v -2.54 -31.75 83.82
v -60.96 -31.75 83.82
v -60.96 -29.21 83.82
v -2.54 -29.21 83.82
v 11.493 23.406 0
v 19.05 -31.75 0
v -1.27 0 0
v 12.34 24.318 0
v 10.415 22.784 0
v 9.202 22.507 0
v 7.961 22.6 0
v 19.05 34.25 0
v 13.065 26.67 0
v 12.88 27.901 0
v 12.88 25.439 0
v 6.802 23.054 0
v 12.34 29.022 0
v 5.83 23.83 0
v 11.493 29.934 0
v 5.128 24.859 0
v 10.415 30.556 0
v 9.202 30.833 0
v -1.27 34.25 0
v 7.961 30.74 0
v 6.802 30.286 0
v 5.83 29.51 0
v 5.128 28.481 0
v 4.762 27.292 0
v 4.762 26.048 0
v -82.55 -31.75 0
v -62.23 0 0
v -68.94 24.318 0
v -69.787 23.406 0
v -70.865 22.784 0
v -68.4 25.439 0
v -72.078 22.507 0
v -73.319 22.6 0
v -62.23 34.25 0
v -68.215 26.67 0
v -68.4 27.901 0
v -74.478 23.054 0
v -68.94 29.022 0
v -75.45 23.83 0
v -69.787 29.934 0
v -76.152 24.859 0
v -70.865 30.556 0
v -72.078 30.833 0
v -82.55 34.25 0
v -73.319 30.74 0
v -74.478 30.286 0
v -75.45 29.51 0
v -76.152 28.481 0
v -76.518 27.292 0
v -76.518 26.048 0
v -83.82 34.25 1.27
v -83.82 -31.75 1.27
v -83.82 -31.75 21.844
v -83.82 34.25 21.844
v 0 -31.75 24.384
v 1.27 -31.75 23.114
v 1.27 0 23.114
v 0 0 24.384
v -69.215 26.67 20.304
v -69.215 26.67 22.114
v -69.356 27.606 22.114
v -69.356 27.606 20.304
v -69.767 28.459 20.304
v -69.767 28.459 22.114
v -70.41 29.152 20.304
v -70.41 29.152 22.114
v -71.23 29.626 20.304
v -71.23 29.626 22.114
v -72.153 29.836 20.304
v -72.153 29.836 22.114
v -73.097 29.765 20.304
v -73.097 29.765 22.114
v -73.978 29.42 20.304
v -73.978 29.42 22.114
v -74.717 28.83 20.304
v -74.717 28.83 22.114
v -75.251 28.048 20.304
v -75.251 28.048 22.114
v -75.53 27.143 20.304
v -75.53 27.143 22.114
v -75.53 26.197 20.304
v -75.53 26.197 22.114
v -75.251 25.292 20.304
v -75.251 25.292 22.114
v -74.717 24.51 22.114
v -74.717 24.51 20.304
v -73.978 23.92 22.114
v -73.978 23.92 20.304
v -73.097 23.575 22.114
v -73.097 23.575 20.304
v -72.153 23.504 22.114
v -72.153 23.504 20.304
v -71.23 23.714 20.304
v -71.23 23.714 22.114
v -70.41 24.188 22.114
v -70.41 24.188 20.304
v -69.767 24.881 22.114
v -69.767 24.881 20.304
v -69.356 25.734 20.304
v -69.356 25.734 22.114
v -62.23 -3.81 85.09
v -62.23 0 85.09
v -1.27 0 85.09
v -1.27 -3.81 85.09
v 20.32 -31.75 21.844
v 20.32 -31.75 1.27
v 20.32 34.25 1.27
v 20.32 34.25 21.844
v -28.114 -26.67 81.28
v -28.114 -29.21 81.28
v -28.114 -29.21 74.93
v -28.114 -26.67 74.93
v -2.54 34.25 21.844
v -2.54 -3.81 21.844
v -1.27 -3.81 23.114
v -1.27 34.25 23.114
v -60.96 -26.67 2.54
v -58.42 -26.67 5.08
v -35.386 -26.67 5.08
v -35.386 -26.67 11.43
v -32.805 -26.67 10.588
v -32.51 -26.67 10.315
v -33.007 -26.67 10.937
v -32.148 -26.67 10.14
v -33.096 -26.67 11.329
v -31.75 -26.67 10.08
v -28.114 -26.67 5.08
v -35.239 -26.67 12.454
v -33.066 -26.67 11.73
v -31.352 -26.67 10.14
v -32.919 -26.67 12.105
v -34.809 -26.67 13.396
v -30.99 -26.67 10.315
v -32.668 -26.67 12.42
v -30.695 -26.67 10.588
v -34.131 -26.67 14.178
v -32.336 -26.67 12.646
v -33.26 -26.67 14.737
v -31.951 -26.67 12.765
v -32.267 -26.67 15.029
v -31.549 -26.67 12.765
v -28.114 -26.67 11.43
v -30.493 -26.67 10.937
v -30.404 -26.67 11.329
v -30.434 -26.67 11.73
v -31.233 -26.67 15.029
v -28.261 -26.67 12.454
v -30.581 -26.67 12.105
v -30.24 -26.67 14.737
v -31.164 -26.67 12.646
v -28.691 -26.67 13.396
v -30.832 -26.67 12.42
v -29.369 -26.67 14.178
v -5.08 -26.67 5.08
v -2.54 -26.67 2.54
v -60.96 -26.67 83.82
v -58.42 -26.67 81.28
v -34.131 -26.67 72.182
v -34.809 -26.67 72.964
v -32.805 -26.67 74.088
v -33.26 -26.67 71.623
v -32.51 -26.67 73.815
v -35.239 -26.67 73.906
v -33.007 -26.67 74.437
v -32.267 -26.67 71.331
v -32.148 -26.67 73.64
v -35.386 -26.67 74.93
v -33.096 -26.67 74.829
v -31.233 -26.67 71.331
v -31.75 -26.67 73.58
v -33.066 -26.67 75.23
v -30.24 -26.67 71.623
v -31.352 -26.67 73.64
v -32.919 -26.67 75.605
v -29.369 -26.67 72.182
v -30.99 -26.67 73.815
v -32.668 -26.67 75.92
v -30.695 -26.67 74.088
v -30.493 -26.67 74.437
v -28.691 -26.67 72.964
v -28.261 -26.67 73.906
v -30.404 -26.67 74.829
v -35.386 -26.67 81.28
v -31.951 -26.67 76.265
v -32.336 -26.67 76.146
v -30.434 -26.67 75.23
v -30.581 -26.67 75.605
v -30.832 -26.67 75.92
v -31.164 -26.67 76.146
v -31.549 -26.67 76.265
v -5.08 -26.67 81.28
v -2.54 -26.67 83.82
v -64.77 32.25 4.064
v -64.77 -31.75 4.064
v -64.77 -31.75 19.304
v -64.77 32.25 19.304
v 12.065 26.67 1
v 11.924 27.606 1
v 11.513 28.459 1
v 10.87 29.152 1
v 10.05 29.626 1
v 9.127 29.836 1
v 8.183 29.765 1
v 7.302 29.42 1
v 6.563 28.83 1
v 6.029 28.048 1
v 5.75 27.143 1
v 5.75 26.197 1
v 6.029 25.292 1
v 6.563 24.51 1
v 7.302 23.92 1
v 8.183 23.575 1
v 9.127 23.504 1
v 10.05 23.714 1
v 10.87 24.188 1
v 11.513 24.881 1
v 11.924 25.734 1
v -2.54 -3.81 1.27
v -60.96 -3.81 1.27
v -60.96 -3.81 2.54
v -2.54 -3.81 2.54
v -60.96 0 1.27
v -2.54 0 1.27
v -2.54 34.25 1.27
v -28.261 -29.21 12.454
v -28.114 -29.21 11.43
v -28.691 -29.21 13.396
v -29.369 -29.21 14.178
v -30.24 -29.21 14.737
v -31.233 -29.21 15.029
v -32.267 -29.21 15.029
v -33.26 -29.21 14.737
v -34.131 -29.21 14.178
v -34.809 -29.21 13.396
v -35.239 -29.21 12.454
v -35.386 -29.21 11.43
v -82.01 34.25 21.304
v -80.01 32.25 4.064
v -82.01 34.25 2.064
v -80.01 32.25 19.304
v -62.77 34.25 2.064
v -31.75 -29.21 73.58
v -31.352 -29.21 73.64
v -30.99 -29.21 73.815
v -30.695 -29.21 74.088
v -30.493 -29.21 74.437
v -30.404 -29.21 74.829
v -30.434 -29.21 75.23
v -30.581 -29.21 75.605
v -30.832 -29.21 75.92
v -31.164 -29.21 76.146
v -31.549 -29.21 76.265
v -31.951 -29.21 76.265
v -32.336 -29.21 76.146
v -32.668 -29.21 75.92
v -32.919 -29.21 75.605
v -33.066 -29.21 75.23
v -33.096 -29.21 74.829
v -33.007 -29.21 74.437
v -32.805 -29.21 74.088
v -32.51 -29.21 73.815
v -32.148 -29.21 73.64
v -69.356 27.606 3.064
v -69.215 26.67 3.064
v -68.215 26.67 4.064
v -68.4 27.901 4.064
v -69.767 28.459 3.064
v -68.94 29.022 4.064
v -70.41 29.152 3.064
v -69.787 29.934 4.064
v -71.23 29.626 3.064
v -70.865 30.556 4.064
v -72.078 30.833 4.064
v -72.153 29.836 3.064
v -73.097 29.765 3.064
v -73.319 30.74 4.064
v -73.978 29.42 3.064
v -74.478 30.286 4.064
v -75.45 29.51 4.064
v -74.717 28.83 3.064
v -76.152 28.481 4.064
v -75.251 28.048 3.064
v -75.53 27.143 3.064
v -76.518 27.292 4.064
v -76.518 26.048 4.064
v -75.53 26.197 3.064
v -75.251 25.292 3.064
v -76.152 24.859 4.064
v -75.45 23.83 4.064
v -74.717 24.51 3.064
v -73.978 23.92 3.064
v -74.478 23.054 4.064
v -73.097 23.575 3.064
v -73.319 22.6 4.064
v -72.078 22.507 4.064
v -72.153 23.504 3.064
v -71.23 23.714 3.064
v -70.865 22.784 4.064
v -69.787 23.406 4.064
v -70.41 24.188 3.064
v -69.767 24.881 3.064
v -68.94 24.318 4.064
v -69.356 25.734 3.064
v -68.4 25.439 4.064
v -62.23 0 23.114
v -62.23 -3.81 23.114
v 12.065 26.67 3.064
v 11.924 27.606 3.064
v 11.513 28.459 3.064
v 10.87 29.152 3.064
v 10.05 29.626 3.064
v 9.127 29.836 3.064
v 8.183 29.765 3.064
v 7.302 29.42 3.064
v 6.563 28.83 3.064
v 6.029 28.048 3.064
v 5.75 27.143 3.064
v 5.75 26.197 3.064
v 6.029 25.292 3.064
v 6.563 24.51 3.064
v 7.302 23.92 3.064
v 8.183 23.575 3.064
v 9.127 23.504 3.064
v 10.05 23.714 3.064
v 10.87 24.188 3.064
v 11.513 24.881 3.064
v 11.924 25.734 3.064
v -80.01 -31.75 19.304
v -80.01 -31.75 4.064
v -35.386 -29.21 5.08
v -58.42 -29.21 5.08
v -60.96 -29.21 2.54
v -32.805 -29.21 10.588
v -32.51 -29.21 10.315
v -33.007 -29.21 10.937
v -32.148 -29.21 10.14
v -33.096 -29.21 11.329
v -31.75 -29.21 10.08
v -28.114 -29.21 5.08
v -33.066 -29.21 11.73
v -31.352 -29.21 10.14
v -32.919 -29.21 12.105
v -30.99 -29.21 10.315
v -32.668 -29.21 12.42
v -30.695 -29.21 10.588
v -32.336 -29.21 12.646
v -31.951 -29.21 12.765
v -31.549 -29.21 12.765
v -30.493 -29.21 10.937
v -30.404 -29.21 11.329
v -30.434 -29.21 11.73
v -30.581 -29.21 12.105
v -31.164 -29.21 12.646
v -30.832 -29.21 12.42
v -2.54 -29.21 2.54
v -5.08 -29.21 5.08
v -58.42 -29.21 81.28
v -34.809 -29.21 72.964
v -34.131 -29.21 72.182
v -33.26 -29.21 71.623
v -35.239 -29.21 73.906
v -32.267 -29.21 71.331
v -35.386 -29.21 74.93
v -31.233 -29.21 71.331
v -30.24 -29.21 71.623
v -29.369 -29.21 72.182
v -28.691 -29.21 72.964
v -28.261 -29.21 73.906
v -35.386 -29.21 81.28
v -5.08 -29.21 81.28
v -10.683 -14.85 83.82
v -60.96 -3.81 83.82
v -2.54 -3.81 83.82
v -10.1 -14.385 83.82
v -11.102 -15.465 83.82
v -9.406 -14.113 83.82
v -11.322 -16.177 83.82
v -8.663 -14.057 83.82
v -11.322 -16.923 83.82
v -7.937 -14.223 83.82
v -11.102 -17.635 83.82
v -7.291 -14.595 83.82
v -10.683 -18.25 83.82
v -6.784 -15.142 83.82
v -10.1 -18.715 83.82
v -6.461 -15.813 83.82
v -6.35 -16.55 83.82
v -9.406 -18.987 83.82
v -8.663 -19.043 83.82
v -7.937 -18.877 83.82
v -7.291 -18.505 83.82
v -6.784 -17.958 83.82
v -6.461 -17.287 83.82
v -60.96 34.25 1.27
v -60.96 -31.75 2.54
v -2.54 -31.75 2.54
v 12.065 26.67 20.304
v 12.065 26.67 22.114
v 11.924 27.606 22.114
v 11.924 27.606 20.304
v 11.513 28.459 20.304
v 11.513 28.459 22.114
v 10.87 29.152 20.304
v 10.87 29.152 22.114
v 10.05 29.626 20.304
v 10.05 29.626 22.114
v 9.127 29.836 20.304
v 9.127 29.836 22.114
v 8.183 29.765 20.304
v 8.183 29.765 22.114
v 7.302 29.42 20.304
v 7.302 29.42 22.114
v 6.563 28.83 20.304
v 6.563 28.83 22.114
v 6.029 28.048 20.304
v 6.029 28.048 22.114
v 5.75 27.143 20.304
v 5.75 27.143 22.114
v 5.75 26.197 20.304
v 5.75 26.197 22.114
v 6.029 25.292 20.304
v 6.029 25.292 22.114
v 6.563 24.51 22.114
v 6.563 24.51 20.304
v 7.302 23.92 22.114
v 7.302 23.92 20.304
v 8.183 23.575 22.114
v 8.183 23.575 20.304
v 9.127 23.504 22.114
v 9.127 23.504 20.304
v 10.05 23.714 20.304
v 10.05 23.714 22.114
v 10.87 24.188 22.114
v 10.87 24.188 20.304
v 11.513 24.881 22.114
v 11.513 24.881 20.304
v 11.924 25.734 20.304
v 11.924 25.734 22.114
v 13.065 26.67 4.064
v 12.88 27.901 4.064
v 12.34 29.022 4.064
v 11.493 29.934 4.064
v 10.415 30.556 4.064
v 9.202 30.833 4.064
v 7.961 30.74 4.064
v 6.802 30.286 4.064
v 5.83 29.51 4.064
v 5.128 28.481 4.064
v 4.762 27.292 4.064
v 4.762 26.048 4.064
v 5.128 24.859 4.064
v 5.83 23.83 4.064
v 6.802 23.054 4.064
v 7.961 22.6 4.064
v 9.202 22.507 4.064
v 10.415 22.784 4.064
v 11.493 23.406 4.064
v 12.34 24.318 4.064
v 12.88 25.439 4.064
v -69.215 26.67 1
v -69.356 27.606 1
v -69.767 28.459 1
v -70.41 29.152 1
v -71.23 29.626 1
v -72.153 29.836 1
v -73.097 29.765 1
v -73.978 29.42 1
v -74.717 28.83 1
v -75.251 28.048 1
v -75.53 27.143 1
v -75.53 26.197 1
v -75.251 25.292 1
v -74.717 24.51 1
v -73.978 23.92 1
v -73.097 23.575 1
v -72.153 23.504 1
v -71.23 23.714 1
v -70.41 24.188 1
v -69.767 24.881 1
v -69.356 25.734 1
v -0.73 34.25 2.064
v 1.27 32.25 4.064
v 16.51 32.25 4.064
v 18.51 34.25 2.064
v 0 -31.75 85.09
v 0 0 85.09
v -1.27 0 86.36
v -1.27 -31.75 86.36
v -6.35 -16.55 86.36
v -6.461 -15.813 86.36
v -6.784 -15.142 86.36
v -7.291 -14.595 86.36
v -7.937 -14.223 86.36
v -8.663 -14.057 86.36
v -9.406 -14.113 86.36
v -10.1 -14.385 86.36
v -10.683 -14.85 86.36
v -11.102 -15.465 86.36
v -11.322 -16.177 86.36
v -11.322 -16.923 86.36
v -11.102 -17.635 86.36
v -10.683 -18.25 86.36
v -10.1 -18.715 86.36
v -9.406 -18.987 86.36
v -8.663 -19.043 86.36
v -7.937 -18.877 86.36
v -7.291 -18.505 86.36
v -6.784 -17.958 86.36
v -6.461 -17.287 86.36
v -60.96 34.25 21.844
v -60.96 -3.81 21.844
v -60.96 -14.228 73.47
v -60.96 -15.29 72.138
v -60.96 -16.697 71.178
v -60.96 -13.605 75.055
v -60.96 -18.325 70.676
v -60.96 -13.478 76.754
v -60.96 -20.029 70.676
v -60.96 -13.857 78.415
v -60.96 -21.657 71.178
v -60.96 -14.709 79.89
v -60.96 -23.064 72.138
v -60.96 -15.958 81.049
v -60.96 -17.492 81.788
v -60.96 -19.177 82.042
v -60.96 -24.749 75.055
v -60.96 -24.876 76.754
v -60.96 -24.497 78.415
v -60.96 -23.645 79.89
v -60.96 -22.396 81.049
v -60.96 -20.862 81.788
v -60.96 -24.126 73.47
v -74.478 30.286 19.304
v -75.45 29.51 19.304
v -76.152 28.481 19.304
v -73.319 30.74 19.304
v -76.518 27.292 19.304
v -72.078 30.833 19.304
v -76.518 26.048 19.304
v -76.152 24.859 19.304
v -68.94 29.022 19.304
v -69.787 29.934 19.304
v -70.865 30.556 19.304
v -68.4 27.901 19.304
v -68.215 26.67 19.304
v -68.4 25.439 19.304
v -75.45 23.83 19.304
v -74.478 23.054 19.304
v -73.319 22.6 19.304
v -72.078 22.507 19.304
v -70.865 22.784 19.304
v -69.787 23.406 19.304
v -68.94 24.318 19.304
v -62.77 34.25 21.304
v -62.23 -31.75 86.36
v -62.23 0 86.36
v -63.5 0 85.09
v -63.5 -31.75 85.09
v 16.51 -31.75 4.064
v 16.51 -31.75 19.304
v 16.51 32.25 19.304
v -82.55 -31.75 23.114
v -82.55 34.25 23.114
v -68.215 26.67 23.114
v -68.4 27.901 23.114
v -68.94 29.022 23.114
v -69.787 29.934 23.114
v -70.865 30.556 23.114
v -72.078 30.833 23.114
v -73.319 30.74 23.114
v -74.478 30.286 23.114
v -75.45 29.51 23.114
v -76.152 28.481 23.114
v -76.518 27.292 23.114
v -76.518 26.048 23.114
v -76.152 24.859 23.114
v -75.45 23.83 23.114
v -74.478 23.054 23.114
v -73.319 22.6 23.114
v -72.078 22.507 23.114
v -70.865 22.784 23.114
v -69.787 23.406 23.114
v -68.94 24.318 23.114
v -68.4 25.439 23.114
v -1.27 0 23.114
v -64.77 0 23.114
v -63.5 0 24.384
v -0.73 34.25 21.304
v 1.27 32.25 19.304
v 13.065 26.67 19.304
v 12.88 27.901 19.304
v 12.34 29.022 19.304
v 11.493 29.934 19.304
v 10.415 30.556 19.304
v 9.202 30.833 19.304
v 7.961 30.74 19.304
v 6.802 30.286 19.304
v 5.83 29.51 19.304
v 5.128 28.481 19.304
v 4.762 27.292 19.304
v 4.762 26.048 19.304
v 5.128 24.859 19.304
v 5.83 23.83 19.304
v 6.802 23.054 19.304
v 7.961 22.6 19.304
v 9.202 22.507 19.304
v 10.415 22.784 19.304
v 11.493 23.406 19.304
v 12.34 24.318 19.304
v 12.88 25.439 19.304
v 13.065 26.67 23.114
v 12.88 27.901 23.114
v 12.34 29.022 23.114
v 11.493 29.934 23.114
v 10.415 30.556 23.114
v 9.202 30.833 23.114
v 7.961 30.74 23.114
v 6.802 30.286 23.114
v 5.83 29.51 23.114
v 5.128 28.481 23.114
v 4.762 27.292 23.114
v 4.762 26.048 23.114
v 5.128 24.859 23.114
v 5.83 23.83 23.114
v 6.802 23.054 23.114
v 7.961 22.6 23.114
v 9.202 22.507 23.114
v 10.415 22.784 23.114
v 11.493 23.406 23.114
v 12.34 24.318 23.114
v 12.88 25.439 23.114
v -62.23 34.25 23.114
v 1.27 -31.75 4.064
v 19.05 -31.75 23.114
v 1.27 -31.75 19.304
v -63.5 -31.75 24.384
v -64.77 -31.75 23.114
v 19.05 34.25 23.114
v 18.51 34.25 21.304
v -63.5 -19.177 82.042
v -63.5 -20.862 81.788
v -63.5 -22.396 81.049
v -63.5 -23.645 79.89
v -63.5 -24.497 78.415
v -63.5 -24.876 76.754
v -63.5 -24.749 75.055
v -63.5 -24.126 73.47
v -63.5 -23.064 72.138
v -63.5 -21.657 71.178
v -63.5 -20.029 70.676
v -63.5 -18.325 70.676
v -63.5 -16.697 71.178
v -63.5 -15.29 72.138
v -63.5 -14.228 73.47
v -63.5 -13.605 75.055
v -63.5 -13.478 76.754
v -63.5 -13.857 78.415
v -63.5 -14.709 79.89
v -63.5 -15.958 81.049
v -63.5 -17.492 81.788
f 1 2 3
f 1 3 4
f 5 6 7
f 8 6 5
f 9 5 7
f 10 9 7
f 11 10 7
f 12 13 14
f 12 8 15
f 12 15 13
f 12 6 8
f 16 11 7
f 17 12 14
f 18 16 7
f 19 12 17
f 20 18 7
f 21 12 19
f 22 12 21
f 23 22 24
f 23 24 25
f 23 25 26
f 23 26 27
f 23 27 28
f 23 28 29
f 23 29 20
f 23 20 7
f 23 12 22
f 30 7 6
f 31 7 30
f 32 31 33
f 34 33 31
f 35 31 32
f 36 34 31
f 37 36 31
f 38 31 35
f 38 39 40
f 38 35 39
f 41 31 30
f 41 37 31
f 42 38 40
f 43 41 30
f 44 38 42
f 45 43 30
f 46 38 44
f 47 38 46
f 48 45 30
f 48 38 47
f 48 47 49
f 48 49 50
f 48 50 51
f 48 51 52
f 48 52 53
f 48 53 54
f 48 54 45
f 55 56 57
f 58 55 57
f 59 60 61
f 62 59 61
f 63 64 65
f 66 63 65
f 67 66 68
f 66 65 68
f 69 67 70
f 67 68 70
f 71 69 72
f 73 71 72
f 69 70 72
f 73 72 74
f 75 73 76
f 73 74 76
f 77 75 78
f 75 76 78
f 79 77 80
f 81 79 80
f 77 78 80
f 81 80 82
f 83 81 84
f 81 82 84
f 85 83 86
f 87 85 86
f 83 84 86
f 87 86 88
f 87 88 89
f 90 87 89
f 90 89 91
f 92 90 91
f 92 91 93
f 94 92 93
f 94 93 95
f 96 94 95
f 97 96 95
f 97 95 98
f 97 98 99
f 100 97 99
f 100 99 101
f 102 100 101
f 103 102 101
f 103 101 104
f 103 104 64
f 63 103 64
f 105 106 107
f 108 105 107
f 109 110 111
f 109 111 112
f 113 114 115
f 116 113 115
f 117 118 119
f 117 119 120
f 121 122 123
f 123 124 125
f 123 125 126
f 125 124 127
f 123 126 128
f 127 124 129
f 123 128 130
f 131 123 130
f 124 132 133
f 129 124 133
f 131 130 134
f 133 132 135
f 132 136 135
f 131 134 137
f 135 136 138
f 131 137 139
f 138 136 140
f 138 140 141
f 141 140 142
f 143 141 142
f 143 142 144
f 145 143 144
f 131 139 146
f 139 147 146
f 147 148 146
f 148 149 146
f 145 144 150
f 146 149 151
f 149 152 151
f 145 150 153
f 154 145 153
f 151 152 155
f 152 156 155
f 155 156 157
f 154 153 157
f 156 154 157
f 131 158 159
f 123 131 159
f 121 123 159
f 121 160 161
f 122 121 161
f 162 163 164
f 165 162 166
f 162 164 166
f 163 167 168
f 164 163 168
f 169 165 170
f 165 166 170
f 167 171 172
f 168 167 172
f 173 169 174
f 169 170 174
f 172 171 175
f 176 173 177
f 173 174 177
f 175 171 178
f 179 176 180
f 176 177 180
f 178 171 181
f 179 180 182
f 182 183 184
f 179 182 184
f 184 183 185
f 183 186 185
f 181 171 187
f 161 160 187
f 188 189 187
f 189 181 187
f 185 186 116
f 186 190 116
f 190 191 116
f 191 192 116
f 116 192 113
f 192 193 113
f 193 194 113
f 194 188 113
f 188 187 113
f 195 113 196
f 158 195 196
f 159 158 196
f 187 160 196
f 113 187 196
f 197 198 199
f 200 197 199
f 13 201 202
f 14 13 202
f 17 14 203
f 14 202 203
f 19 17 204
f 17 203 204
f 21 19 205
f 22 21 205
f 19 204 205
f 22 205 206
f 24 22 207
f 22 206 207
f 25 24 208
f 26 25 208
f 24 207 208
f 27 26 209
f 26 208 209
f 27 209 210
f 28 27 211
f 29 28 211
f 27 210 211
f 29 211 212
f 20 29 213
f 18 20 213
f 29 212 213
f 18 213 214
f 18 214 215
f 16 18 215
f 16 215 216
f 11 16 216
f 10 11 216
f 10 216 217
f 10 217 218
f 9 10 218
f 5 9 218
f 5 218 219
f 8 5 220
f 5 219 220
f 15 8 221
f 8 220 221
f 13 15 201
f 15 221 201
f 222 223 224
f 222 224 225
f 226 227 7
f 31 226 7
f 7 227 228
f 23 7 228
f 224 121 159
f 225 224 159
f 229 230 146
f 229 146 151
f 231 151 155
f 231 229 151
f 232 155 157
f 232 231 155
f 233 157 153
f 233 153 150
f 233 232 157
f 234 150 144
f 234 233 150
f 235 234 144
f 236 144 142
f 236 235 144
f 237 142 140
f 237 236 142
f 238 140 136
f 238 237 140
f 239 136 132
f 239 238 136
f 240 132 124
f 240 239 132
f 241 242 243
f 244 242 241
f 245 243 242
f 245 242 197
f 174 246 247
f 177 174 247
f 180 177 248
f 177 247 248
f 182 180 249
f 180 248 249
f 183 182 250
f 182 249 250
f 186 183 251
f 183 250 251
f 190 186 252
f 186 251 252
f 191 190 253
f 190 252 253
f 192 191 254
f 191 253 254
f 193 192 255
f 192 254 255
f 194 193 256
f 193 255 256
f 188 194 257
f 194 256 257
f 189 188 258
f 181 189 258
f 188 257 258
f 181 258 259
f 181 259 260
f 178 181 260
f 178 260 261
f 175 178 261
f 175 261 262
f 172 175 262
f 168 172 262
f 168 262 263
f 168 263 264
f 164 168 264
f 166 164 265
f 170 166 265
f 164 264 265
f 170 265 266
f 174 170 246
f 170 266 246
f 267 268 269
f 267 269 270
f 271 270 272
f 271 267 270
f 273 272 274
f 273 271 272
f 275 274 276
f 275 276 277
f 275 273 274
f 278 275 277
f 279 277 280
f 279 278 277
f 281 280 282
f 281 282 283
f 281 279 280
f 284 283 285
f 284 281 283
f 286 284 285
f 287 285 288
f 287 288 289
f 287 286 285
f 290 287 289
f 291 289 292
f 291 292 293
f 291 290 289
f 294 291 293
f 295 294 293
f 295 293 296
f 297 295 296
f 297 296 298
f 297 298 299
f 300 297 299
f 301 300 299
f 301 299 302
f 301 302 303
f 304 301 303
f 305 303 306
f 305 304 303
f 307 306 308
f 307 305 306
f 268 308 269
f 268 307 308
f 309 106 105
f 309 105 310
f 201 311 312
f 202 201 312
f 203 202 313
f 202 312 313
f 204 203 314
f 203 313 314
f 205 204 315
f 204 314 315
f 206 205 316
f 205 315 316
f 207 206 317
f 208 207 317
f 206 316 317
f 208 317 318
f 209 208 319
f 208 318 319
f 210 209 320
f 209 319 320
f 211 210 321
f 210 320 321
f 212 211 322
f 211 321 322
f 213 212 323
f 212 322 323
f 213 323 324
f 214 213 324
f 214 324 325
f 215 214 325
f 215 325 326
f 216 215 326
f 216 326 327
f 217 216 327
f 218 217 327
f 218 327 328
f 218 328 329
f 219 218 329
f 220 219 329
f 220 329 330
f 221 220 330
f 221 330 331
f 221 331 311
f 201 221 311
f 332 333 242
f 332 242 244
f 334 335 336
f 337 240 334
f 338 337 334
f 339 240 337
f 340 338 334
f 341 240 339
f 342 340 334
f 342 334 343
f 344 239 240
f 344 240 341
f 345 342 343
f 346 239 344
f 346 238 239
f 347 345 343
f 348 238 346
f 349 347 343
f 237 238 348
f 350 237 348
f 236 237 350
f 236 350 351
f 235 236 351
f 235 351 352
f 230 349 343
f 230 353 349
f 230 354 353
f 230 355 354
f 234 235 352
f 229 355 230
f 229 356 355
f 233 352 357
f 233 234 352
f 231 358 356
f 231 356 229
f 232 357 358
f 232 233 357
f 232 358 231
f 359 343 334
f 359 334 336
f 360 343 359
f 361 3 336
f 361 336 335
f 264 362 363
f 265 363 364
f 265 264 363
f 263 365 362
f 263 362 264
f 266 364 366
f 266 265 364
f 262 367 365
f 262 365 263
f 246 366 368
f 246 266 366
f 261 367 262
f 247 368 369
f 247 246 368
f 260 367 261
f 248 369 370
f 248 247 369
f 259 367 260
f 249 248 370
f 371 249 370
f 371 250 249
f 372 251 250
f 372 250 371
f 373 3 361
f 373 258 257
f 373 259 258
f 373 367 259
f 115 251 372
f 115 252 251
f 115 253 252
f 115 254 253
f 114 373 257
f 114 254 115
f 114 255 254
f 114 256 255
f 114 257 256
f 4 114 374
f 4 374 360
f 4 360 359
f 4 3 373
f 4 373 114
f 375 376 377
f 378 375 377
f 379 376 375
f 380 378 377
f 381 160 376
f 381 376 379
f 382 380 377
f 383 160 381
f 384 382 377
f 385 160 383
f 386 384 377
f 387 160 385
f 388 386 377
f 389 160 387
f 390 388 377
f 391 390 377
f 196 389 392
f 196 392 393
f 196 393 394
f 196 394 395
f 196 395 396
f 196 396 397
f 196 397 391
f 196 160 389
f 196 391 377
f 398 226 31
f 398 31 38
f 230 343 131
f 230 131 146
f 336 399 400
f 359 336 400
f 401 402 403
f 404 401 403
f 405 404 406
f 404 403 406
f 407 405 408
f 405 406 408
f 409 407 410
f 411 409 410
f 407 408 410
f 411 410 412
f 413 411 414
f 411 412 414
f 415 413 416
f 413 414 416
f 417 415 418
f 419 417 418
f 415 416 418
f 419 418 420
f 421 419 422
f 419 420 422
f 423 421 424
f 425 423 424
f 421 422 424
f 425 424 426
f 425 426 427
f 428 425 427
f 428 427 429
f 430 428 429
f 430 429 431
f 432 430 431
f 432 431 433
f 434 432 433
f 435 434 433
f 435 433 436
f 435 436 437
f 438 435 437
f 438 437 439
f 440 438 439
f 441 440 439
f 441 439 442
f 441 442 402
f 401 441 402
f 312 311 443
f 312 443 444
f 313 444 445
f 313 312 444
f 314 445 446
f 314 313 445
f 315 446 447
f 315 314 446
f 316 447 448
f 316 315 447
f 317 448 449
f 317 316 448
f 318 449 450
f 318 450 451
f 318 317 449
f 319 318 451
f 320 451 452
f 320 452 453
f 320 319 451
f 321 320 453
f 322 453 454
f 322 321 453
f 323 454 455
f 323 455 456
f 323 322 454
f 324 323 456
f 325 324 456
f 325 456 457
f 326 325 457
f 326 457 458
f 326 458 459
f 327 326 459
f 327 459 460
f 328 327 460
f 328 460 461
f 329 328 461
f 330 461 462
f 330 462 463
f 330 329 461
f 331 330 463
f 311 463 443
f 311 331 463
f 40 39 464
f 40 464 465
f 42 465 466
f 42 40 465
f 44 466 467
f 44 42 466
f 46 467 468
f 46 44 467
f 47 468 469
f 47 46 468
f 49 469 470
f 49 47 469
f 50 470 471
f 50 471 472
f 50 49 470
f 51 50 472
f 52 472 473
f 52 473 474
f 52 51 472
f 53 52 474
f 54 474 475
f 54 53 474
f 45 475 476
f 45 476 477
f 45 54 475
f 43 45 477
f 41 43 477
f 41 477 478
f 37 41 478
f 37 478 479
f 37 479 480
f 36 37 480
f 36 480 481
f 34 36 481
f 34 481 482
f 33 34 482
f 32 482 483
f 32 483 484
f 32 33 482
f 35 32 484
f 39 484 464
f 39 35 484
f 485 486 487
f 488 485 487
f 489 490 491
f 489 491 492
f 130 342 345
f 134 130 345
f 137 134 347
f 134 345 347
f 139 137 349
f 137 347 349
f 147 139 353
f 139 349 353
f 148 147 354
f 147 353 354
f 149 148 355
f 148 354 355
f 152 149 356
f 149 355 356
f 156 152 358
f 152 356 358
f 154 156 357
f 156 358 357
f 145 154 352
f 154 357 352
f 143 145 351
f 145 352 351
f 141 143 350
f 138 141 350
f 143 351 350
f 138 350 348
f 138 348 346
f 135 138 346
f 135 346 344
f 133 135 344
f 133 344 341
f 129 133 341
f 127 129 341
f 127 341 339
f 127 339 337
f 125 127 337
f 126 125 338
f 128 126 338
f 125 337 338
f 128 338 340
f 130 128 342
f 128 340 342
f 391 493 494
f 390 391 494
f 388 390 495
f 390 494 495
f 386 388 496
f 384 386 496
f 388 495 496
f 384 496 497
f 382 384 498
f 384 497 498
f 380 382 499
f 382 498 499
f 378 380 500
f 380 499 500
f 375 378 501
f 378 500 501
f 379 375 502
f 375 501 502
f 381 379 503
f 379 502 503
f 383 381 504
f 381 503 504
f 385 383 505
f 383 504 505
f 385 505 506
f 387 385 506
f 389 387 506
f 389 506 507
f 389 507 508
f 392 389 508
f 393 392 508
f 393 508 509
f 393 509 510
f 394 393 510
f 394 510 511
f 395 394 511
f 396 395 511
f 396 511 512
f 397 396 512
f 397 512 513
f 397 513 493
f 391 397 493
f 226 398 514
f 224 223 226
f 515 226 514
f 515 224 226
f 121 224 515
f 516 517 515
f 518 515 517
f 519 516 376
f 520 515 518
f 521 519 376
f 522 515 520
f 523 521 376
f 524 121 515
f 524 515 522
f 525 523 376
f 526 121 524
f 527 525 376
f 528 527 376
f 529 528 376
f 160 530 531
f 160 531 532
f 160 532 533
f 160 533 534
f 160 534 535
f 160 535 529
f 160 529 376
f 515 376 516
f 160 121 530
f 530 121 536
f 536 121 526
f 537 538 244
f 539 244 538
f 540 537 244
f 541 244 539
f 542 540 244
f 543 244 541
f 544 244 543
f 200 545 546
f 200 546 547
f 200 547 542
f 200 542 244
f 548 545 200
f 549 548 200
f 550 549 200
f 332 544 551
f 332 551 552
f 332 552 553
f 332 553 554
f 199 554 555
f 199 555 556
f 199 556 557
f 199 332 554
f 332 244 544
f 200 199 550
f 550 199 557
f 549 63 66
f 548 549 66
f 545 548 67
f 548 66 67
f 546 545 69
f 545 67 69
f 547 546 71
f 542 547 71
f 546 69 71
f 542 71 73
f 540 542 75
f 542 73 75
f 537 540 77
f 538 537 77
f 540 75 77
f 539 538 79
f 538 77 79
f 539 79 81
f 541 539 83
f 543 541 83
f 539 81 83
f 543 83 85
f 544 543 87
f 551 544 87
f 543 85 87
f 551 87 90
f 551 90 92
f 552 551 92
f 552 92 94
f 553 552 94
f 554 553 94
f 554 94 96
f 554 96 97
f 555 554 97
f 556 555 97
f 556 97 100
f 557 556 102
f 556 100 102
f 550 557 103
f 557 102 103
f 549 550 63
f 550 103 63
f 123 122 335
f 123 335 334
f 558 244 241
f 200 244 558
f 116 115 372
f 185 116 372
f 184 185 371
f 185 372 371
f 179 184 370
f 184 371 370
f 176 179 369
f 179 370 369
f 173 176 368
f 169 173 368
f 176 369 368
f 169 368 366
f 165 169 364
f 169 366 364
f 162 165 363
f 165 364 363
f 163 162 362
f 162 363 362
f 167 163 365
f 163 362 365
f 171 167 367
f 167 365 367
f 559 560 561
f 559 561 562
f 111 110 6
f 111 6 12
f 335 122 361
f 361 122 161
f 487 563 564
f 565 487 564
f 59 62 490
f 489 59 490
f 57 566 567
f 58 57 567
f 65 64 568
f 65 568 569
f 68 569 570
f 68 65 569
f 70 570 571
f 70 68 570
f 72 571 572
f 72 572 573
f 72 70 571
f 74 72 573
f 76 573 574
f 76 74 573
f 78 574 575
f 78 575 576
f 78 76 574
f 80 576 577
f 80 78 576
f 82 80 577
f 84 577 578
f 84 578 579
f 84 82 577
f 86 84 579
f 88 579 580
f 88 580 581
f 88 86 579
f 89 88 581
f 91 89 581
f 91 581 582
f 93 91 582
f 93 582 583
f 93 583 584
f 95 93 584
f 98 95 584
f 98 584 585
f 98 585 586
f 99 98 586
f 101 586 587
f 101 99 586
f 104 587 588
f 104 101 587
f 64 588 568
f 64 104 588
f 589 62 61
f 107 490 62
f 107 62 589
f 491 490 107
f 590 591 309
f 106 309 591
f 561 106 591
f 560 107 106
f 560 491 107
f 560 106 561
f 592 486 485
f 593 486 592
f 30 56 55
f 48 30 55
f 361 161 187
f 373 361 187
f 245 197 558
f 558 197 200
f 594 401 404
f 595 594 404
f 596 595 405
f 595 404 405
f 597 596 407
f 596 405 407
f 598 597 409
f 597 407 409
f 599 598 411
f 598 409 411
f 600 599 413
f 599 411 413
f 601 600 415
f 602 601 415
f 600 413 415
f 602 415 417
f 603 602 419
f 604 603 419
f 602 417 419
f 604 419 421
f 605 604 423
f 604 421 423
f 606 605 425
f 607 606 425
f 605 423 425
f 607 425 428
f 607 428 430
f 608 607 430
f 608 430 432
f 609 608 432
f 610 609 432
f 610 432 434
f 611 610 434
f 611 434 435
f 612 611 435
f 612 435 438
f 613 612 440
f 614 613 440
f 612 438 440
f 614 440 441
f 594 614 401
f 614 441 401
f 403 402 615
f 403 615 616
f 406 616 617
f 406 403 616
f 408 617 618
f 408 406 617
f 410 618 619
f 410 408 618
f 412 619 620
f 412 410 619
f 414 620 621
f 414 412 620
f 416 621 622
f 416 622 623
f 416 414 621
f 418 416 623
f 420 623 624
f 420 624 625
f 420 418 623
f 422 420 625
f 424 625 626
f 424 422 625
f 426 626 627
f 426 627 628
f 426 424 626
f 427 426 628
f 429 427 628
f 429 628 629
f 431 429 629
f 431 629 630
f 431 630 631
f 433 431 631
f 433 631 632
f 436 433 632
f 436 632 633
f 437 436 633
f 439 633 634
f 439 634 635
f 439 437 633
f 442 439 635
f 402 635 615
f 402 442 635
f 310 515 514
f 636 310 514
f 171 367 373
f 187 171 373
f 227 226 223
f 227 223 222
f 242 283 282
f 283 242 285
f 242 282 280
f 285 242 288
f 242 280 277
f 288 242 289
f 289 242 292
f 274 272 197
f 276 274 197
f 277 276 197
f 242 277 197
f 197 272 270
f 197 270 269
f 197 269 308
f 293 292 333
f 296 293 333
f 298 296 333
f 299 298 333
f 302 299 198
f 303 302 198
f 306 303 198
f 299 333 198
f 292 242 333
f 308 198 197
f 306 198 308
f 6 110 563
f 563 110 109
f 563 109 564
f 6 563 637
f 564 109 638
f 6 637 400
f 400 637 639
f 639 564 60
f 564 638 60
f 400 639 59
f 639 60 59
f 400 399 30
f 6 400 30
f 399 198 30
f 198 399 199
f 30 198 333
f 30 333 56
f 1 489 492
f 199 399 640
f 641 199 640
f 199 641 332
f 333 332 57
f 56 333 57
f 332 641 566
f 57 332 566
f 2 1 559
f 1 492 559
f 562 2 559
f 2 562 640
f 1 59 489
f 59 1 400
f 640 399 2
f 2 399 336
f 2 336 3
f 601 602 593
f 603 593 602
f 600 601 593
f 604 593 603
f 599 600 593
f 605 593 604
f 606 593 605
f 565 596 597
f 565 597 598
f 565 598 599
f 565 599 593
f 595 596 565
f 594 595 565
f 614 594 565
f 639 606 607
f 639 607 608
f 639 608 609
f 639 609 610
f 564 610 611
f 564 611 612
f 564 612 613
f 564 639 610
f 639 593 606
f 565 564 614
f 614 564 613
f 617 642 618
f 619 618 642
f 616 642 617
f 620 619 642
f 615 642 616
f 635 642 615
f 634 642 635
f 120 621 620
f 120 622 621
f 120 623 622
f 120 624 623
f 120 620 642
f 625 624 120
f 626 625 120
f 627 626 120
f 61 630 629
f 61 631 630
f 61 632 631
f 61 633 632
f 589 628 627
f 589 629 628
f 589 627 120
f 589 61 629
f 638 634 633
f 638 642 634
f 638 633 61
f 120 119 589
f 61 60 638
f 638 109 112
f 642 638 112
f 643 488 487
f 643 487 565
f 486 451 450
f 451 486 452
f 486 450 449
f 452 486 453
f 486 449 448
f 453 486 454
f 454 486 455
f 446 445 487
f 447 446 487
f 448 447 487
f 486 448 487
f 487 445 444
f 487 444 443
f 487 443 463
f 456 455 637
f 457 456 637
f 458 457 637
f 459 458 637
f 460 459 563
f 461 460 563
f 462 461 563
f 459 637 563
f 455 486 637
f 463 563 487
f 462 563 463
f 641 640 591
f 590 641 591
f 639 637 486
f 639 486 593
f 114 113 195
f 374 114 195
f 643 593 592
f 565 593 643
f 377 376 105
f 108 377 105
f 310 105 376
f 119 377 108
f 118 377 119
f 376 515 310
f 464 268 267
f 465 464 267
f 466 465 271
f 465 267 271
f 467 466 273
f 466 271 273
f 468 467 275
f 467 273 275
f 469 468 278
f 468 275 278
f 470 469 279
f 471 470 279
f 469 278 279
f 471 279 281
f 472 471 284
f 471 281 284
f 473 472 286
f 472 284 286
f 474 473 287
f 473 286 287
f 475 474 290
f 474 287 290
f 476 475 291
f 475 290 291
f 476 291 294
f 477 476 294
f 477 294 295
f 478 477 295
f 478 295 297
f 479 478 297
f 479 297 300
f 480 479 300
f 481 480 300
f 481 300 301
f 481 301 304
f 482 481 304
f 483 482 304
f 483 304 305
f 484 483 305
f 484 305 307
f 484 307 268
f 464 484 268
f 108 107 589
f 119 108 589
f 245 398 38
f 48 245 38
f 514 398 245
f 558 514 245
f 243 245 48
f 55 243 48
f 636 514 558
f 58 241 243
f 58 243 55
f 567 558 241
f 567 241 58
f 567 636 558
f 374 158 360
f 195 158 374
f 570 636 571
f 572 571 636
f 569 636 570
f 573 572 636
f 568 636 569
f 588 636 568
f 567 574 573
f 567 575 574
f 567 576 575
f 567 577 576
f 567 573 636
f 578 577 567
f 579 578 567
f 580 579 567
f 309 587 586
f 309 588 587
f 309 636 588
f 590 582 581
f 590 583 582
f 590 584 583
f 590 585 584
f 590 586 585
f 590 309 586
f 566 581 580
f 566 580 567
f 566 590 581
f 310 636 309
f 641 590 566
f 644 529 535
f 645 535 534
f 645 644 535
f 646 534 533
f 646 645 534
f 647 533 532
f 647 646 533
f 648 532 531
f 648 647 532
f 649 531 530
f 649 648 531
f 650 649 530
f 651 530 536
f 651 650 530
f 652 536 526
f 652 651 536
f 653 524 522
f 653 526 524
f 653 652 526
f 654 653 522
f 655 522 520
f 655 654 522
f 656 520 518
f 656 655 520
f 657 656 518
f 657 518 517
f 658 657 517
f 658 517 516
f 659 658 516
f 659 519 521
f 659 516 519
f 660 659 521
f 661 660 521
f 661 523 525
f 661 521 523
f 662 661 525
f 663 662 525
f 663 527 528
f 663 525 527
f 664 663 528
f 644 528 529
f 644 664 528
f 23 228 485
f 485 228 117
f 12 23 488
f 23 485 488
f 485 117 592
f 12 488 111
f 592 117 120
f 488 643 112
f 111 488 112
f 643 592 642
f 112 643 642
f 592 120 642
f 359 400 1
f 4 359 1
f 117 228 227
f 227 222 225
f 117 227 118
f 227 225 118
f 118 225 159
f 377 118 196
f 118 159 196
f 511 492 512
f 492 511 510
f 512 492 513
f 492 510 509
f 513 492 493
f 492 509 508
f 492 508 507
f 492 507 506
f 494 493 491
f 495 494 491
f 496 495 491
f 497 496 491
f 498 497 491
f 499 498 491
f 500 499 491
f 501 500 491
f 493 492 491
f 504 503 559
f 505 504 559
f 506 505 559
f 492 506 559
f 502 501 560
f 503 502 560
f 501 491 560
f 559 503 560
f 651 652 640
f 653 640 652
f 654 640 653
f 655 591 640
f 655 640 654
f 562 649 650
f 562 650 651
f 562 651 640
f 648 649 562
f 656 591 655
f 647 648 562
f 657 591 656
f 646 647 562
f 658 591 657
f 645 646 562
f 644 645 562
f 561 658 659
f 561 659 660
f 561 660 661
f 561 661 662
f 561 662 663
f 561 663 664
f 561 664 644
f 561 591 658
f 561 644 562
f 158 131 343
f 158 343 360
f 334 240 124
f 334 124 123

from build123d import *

# Parameters (mm, degrees)
SKETCH3_W                  = 63.5
SKETCH3_H                  = 86.36
BOSS_EXTRUDE2_DEPTH        = 31.75
SKETCH4_W                  = 58.42
SKETCH4_H                  = 81.28
CUT_EXTRUDE2_DEPTH         = 27.94
POWER_JACK_HOLE_REACH      = 113.796
SKETCH5_R                  = 5.715
MOTOR_MOUNTING_SHAPE_DEPTH = 63.5
MOTOR_MOUNTING_HOLES_REACH = 129.254
SKETCH8_R                  = 1.6
SKETCH13_W                 = 60.96
SKETCH13_H                 = 83.82
CUT_EXTRUDE7_DEPTH         = 3.81
SKETCH9_W                  = 15.24
SKETCH9_H                  = 15.24
BOSS_EXTRUDE3_DEPTH        = 66
CHAMFER1_SIZE              = 2
CUT_EXTRUDE5_DEPTH         = 126.858217451
SKETCH12_R                 = 3.175
LEG_HOLES_DEPTH            = 111.448682274
CHAMFER2_SIZE              = 1
BOSS_EXTRUDE5_START        = -5.08
SKETCH14_W                 = 58.42
SKETCH14_H                 = 81.28
SKETCH14_W_2               = 53.34
SKETCH14_H_2               = 76.2
BOSS_EXTRUDE5_DEPTH        = 2.54
CUT_EXTRUDE8_REACH         = 127.128
SKETCH15_R                 = 2.5
CHAMFER3_SIZE              = 1.27
SKETCH16_R                 = 1.35
BOSS_EXTRUDE6_DEPTH        = 2.54


with BuildPart() as part:
    # Sketch3 → Boss-Extrude2 (new body)
    with BuildSketch(Plane(origin=(0, 0, 0), x_dir=(-1, 0, 0), z_dir=(0, 1, 0))):
        with Locations((31.75, 43.18)):
            Rectangle(SKETCH3_W, SKETCH3_H)
    extrude(amount=-BOSS_EXTRUDE2_DEPTH)

    # Sketch4 → Cut-Extrude2 (cut)
    with BuildSketch(Plane.XZ.offset(31.75)):
        with Locations((-31.75, 43.18)):
            Rectangle(SKETCH4_W, SKETCH4_H)
    extrude(amount=-CUT_EXTRUDE2_DEPTH, mode=Mode.SUBTRACT)

    # Sketch5 → Power Jack Hole (cut, up to next)
    with BuildSketch(Plane(origin=(-63.5, 0, 0), x_dir=(0, 0, -1), z_dir=(1, 0, 0)), mode=Mode.PRIVATE) as power_jack_hole_sk1:
        with Locations(Location((-76.327, -19.177, 0), (0, 0, 180))):
            Circle(SKETCH5_R)
    power_jack_hole_tool1 = extrude(power_jack_hole_sk1.sketch, amount=POWER_JACK_HOLE_REACH, mode=Mode.PRIVATE) & part.part
    add(power_jack_hole_tool1.solids().sort_by_distance((-63.5, -19.177, 76.327))[0], mode=Mode.SUBTRACT)

    # Sketch6 → Motor Mounting Shape (add)
    with BuildSketch(Plane.ZY.offset(63.5)):
        Polygon((46.54, 0), (46.54, 36.83), (0, 36.83), (0, 34.29), (44, 34.29), (44, 0), align=None)
    extrude(amount=-MOTOR_MOUNTING_SHAPE_DEPTH)

    # Sketch8 → Motor-Mounting-Holes (cut, up to next)
    with BuildSketch(Plane(origin=(0, 36.83, 0), x_dir=(1, 0, 0), z_dir=(0, 1, 0)), mode=Mode.PRIVATE) as motor_mounting_holes_sk1:
        with Locations(Location((-47.25, -7.77, 0), (0, 0, 270))):
            Circle(SKETCH8_R)
    motor_mounting_holes_tool1 = extrude(motor_mounting_holes_sk1.sketch, amount=-MOTOR_MOUNTING_HOLES_REACH, mode=Mode.PRIVATE) & part.part
    # Sketch8 → Motor-Mounting-Holes (cut, up to next)
    with BuildSketch(Plane(origin=(0, 36.83, 0), x_dir=(1, 0, 0), z_dir=(0, 1, 0)), mode=Mode.PRIVATE) as motor_mounting_holes_sk2:
        with Locations(Location((-16.25, -7.77, 0), (0, 0, 270))):
            Circle(SKETCH8_R)
    motor_mounting_holes_tool2 = extrude(motor_mounting_holes_sk2.sketch, amount=-MOTOR_MOUNTING_HOLES_REACH, mode=Mode.PRIVATE) & part.part
    # Sketch8 → Motor-Mounting-Holes (cut, up to next)
    with BuildSketch(Plane(origin=(0, 36.83, 0), x_dir=(1, 0, 0), z_dir=(0, 1, 0)), mode=Mode.PRIVATE) as motor_mounting_holes_sk3:
        with Locations(Location((-16.25, -38.77, 0), (0, 0, 270))):
            Circle(SKETCH8_R)
    motor_mounting_holes_tool3 = extrude(motor_mounting_holes_sk3.sketch, amount=-MOTOR_MOUNTING_HOLES_REACH, mode=Mode.PRIVATE) & part.part
    # Sketch8 → Motor-Mounting-Holes (cut, up to next)
    with BuildSketch(Plane(origin=(0, 36.83, 0), x_dir=(1, 0, 0), z_dir=(0, 1, 0)), mode=Mode.PRIVATE) as motor_mounting_holes_sk4:
        with Locations(Location((-47.25, -38.77, 0), (0, 0, 270))):
            Circle(SKETCH8_R)
    motor_mounting_holes_tool4 = extrude(motor_mounting_holes_sk4.sketch, amount=-MOTOR_MOUNTING_HOLES_REACH, mode=Mode.PRIVATE) & part.part
    # Sketch8 → Motor-Mounting-Holes (cut, up to next)
    with BuildSketch(Plane(origin=(0, 36.83, 0), x_dir=(1, 0, 0), z_dir=(0, 1, 0)), mode=Mode.PRIVATE) as motor_mounting_holes_sk5:
        with BuildLine():
            Line((-40.64, 0), (-22.86, 0))
            Line((-22.86, 0), (-22.86, -23.27))
            ThreePointArc((-22.86, -23.27), (-31.75, -32.16), (-40.64, -23.27))
            Line((-40.64, -23.27), (-40.64, 0))
        make_face()
    motor_mounting_holes_tool5 = extrude(motor_mounting_holes_sk5.sketch, amount=-MOTOR_MOUNTING_HOLES_REACH, mode=Mode.PRIVATE) & part.part
    add(motor_mounting_holes_tool1.solids().sort_by_distance((-47.25, 36.83, 7.77))[0], mode=Mode.SUBTRACT)
    add(motor_mounting_holes_tool2.solids().sort_by_distance((-16.25, 36.83, 7.77))[0], mode=Mode.SUBTRACT)
    add(motor_mounting_holes_tool3.solids().sort_by_distance((-16.25, 36.83, 38.77))[0], mode=Mode.SUBTRACT)
    add(motor_mounting_holes_tool4.solids().sort_by_distance((-47.25, 36.83, 38.77))[0], mode=Mode.SUBTRACT)
    add(motor_mounting_holes_tool5.solids().sort_by_distance((-31.75, 36.83, 15.191166))[0], mode=Mode.SUBTRACT)

    # Sketch13 → Cut-Extrude7 (cut)
    with BuildSketch(Plane(origin=(0, 0, 0), x_dir=(1, 0, 0), z_dir=(0, 1, 0))):
        with Locations((-31.75, -43.18)):
            Rectangle(SKETCH13_W, SKETCH13_H)
    extrude(amount=-CUT_EXTRUDE7_DEPTH, mode=Mode.SUBTRACT)

    # Sketch9 → Boss-Extrude3 (add)
    # profile 1 of 2: a face of its own
    with BuildSketch(Plane.XZ.offset(31.75)):
        Polygon((1.27, 23.114), (-2.54, 23.114), (-2.54, 0), (1.27, 0), (20.32, 0), (20.32, 23.114), align=None)
        with Locations((8.89, 11.684)):
            Rectangle(SKETCH9_W, SKETCH9_H, mode=Mode.SUBTRACT)
    # profile 2 of 2: a face of its own
    with BuildSketch(Plane.XZ.offset(31.75)):
        Polygon((-60.96, 0), (-64.77, 0), (-83.82, 0), (-83.82, 23.114), (-64.77, 23.114), (-60.96, 23.114), align=None)
        with Locations((-72.39, 11.684)):
            Rectangle(SKETCH9_W, SKETCH9_H, mode=Mode.SUBTRACT)
    extrude(amount=-BOSS_EXTRUDE3_DEPTH)

    # Chamfer1
    chamfer1_edges = [part.edges().sort_by_distance(p)[0] for p in [
        (1.27, 34.25, 11.684),
        (8.89, 34.25, 19.304),
        (16.51, 34.25, 11.684),
        (8.89, 34.25, 4.064),
        (-72.39, 34.25, 19.304),
        (-80.01, 34.25, 11.684),
        (-72.39, 34.25, 4.064),
        (-64.77, 34.25, 11.684),
    ]]
    chamfer(chamfer1_edges, length=CHAMFER1_SIZE)

    # Sketch11 → Cut-Extrude5 (cut, through all)
    with BuildSketch(Plane(origin=(0, 0, 0), x_dir=(0, 0, -1), z_dir=(1, 0, 0))):
        Polygon((-44, 0), (-44, 34.29), (0, 34.29), (0, 36.83), (-86.36, 36.83), (-86.36, 0), align=None)
    extrude(amount=-CUT_EXTRUDE5_DEPTH, mode=Mode.SUBTRACT)

    # Sketch12 → Leg Holes (cut, through all)
    with BuildSketch(Plane.XY.offset(23.114)):
        with Locations((8.89, 26.67)):
            Circle(SKETCH12_R)
        with Locations((-72.39, 26.67)):
            Circle(SKETCH12_R)
    extrude(amount=-LEG_HOLES_DEPTH, mode=Mode.SUBTRACT)

    # Chamfer2
    chamfer2_edges = [part.edges().sort_by_distance(p)[0] for p in [
        (5.715, 26.67, 4.064),
        (5.715, 26.67, 19.304),
        (5.715, 26.67, 0),
        (5.715, 26.67, 23.114),
        (-75.565, 26.67, 19.304),
        (-75.565, 26.67, 0),
        (-75.565, 26.67, 4.064),
        (-75.565, 26.67, 23.114),
    ]]
    chamfer(chamfer2_edges, length=CHAMFER2_SIZE)

    # Sketch14 → Boss-Extrude5 (add)
    with BuildSketch(Plane.XZ.offset(31.75).offset(BOSS_EXTRUDE5_START)):
        with Locations((-31.75, 43.18)):
            Rectangle(SKETCH14_W, SKETCH14_H)
        with Locations((-31.75, 43.18)):
            Rectangle(SKETCH14_W_2, SKETCH14_H_2, mode=Mode.SUBTRACT)
    extrude(amount=BOSS_EXTRUDE5_DEPTH)

    # Sketch15 → Cut-Extrude8 (cut, up to next)
    with BuildSketch(Plane.XY.offset(86.36), mode=Mode.PRIVATE) as cut_extrude8_sk1:
        with Locations((-8.85, -16.55)):
            Circle(SKETCH15_R)
    cut_extrude8_tool1 = extrude(cut_extrude8_sk1.sketch, amount=-CUT_EXTRUDE8_REACH, mode=Mode.PRIVATE) & part.part
    add(cut_extrude8_tool1.solids().sort_by_distance((-8.85, -16.55, 86.36))[0], mode=Mode.SUBTRACT)

    # Chamfer3
    chamfer3_edges = [part.edges().sort_by_distance(p)[0] for p in [
        (20.32, 1.25, 0),
        (-2.54, 17.125, 0),
        (0, -15.875, 23.114),
        (-2.54, 15.22, 23.114),
        (20.32, 1.25, 23.114),
        (-60.96, 17.125, 0),
        (-60.96, 15.22, 23.114),
        (-63.5, -15.875, 23.114),
        (-83.82, 1.25, 0),
        (-83.82, 1.25, 23.114),
        (0, -15.875, 86.36),
        (-63.5, -15.875, 86.36),
    ]]
    chamfer(chamfer3_edges, length=CHAMFER3_SIZE - 0.0001)  # a hair under: the kernel refuses the full size

    # Sketch16 → Boss-Extrude6 (add)
    # profile 1 of 2: a face of its own
    with BuildSketch(Plane.XZ.offset(29.21)):
        with BuildLine():
            Line((-35.386, 2.54), (-28.114, 2.54))
            Line((-28.114, 2.54), (-28.114, 11.43))
            ThreePointArc((-28.114, 11.43), (-31.75, 15.066), (-35.386, 11.43))
            Line((-35.386, 11.43), (-35.386, 2.54))
        make_face()
        with Locations(Location((-31.75, 11.43, 0), (0, 0, 270))):
            Circle(SKETCH16_R, mode=Mode.SUBTRACT)
    # profile 2 of 2: a face of its own
    with BuildSketch(Plane.XZ.offset(29.21)):
        with BuildLine():
            Line((-35.386, 74.93), (-35.386, 83.82))
            Line((-35.386, 83.82), (-28.114, 83.82))
            Line((-28.114, 83.82), (-28.114, 74.93))
            ThreePointArc((-28.114, 74.93), (-31.75, 71.294), (-35.386, 74.93))
        make_face()
        with Locations(Location((-31.75, 74.93, 0), (0, 0, 270))):
            Circle(SKETCH16_R, mode=Mode.SUBTRACT)
    extrude(amount=-BOSS_EXTRUDE6_DEPTH)


solid = part.part
